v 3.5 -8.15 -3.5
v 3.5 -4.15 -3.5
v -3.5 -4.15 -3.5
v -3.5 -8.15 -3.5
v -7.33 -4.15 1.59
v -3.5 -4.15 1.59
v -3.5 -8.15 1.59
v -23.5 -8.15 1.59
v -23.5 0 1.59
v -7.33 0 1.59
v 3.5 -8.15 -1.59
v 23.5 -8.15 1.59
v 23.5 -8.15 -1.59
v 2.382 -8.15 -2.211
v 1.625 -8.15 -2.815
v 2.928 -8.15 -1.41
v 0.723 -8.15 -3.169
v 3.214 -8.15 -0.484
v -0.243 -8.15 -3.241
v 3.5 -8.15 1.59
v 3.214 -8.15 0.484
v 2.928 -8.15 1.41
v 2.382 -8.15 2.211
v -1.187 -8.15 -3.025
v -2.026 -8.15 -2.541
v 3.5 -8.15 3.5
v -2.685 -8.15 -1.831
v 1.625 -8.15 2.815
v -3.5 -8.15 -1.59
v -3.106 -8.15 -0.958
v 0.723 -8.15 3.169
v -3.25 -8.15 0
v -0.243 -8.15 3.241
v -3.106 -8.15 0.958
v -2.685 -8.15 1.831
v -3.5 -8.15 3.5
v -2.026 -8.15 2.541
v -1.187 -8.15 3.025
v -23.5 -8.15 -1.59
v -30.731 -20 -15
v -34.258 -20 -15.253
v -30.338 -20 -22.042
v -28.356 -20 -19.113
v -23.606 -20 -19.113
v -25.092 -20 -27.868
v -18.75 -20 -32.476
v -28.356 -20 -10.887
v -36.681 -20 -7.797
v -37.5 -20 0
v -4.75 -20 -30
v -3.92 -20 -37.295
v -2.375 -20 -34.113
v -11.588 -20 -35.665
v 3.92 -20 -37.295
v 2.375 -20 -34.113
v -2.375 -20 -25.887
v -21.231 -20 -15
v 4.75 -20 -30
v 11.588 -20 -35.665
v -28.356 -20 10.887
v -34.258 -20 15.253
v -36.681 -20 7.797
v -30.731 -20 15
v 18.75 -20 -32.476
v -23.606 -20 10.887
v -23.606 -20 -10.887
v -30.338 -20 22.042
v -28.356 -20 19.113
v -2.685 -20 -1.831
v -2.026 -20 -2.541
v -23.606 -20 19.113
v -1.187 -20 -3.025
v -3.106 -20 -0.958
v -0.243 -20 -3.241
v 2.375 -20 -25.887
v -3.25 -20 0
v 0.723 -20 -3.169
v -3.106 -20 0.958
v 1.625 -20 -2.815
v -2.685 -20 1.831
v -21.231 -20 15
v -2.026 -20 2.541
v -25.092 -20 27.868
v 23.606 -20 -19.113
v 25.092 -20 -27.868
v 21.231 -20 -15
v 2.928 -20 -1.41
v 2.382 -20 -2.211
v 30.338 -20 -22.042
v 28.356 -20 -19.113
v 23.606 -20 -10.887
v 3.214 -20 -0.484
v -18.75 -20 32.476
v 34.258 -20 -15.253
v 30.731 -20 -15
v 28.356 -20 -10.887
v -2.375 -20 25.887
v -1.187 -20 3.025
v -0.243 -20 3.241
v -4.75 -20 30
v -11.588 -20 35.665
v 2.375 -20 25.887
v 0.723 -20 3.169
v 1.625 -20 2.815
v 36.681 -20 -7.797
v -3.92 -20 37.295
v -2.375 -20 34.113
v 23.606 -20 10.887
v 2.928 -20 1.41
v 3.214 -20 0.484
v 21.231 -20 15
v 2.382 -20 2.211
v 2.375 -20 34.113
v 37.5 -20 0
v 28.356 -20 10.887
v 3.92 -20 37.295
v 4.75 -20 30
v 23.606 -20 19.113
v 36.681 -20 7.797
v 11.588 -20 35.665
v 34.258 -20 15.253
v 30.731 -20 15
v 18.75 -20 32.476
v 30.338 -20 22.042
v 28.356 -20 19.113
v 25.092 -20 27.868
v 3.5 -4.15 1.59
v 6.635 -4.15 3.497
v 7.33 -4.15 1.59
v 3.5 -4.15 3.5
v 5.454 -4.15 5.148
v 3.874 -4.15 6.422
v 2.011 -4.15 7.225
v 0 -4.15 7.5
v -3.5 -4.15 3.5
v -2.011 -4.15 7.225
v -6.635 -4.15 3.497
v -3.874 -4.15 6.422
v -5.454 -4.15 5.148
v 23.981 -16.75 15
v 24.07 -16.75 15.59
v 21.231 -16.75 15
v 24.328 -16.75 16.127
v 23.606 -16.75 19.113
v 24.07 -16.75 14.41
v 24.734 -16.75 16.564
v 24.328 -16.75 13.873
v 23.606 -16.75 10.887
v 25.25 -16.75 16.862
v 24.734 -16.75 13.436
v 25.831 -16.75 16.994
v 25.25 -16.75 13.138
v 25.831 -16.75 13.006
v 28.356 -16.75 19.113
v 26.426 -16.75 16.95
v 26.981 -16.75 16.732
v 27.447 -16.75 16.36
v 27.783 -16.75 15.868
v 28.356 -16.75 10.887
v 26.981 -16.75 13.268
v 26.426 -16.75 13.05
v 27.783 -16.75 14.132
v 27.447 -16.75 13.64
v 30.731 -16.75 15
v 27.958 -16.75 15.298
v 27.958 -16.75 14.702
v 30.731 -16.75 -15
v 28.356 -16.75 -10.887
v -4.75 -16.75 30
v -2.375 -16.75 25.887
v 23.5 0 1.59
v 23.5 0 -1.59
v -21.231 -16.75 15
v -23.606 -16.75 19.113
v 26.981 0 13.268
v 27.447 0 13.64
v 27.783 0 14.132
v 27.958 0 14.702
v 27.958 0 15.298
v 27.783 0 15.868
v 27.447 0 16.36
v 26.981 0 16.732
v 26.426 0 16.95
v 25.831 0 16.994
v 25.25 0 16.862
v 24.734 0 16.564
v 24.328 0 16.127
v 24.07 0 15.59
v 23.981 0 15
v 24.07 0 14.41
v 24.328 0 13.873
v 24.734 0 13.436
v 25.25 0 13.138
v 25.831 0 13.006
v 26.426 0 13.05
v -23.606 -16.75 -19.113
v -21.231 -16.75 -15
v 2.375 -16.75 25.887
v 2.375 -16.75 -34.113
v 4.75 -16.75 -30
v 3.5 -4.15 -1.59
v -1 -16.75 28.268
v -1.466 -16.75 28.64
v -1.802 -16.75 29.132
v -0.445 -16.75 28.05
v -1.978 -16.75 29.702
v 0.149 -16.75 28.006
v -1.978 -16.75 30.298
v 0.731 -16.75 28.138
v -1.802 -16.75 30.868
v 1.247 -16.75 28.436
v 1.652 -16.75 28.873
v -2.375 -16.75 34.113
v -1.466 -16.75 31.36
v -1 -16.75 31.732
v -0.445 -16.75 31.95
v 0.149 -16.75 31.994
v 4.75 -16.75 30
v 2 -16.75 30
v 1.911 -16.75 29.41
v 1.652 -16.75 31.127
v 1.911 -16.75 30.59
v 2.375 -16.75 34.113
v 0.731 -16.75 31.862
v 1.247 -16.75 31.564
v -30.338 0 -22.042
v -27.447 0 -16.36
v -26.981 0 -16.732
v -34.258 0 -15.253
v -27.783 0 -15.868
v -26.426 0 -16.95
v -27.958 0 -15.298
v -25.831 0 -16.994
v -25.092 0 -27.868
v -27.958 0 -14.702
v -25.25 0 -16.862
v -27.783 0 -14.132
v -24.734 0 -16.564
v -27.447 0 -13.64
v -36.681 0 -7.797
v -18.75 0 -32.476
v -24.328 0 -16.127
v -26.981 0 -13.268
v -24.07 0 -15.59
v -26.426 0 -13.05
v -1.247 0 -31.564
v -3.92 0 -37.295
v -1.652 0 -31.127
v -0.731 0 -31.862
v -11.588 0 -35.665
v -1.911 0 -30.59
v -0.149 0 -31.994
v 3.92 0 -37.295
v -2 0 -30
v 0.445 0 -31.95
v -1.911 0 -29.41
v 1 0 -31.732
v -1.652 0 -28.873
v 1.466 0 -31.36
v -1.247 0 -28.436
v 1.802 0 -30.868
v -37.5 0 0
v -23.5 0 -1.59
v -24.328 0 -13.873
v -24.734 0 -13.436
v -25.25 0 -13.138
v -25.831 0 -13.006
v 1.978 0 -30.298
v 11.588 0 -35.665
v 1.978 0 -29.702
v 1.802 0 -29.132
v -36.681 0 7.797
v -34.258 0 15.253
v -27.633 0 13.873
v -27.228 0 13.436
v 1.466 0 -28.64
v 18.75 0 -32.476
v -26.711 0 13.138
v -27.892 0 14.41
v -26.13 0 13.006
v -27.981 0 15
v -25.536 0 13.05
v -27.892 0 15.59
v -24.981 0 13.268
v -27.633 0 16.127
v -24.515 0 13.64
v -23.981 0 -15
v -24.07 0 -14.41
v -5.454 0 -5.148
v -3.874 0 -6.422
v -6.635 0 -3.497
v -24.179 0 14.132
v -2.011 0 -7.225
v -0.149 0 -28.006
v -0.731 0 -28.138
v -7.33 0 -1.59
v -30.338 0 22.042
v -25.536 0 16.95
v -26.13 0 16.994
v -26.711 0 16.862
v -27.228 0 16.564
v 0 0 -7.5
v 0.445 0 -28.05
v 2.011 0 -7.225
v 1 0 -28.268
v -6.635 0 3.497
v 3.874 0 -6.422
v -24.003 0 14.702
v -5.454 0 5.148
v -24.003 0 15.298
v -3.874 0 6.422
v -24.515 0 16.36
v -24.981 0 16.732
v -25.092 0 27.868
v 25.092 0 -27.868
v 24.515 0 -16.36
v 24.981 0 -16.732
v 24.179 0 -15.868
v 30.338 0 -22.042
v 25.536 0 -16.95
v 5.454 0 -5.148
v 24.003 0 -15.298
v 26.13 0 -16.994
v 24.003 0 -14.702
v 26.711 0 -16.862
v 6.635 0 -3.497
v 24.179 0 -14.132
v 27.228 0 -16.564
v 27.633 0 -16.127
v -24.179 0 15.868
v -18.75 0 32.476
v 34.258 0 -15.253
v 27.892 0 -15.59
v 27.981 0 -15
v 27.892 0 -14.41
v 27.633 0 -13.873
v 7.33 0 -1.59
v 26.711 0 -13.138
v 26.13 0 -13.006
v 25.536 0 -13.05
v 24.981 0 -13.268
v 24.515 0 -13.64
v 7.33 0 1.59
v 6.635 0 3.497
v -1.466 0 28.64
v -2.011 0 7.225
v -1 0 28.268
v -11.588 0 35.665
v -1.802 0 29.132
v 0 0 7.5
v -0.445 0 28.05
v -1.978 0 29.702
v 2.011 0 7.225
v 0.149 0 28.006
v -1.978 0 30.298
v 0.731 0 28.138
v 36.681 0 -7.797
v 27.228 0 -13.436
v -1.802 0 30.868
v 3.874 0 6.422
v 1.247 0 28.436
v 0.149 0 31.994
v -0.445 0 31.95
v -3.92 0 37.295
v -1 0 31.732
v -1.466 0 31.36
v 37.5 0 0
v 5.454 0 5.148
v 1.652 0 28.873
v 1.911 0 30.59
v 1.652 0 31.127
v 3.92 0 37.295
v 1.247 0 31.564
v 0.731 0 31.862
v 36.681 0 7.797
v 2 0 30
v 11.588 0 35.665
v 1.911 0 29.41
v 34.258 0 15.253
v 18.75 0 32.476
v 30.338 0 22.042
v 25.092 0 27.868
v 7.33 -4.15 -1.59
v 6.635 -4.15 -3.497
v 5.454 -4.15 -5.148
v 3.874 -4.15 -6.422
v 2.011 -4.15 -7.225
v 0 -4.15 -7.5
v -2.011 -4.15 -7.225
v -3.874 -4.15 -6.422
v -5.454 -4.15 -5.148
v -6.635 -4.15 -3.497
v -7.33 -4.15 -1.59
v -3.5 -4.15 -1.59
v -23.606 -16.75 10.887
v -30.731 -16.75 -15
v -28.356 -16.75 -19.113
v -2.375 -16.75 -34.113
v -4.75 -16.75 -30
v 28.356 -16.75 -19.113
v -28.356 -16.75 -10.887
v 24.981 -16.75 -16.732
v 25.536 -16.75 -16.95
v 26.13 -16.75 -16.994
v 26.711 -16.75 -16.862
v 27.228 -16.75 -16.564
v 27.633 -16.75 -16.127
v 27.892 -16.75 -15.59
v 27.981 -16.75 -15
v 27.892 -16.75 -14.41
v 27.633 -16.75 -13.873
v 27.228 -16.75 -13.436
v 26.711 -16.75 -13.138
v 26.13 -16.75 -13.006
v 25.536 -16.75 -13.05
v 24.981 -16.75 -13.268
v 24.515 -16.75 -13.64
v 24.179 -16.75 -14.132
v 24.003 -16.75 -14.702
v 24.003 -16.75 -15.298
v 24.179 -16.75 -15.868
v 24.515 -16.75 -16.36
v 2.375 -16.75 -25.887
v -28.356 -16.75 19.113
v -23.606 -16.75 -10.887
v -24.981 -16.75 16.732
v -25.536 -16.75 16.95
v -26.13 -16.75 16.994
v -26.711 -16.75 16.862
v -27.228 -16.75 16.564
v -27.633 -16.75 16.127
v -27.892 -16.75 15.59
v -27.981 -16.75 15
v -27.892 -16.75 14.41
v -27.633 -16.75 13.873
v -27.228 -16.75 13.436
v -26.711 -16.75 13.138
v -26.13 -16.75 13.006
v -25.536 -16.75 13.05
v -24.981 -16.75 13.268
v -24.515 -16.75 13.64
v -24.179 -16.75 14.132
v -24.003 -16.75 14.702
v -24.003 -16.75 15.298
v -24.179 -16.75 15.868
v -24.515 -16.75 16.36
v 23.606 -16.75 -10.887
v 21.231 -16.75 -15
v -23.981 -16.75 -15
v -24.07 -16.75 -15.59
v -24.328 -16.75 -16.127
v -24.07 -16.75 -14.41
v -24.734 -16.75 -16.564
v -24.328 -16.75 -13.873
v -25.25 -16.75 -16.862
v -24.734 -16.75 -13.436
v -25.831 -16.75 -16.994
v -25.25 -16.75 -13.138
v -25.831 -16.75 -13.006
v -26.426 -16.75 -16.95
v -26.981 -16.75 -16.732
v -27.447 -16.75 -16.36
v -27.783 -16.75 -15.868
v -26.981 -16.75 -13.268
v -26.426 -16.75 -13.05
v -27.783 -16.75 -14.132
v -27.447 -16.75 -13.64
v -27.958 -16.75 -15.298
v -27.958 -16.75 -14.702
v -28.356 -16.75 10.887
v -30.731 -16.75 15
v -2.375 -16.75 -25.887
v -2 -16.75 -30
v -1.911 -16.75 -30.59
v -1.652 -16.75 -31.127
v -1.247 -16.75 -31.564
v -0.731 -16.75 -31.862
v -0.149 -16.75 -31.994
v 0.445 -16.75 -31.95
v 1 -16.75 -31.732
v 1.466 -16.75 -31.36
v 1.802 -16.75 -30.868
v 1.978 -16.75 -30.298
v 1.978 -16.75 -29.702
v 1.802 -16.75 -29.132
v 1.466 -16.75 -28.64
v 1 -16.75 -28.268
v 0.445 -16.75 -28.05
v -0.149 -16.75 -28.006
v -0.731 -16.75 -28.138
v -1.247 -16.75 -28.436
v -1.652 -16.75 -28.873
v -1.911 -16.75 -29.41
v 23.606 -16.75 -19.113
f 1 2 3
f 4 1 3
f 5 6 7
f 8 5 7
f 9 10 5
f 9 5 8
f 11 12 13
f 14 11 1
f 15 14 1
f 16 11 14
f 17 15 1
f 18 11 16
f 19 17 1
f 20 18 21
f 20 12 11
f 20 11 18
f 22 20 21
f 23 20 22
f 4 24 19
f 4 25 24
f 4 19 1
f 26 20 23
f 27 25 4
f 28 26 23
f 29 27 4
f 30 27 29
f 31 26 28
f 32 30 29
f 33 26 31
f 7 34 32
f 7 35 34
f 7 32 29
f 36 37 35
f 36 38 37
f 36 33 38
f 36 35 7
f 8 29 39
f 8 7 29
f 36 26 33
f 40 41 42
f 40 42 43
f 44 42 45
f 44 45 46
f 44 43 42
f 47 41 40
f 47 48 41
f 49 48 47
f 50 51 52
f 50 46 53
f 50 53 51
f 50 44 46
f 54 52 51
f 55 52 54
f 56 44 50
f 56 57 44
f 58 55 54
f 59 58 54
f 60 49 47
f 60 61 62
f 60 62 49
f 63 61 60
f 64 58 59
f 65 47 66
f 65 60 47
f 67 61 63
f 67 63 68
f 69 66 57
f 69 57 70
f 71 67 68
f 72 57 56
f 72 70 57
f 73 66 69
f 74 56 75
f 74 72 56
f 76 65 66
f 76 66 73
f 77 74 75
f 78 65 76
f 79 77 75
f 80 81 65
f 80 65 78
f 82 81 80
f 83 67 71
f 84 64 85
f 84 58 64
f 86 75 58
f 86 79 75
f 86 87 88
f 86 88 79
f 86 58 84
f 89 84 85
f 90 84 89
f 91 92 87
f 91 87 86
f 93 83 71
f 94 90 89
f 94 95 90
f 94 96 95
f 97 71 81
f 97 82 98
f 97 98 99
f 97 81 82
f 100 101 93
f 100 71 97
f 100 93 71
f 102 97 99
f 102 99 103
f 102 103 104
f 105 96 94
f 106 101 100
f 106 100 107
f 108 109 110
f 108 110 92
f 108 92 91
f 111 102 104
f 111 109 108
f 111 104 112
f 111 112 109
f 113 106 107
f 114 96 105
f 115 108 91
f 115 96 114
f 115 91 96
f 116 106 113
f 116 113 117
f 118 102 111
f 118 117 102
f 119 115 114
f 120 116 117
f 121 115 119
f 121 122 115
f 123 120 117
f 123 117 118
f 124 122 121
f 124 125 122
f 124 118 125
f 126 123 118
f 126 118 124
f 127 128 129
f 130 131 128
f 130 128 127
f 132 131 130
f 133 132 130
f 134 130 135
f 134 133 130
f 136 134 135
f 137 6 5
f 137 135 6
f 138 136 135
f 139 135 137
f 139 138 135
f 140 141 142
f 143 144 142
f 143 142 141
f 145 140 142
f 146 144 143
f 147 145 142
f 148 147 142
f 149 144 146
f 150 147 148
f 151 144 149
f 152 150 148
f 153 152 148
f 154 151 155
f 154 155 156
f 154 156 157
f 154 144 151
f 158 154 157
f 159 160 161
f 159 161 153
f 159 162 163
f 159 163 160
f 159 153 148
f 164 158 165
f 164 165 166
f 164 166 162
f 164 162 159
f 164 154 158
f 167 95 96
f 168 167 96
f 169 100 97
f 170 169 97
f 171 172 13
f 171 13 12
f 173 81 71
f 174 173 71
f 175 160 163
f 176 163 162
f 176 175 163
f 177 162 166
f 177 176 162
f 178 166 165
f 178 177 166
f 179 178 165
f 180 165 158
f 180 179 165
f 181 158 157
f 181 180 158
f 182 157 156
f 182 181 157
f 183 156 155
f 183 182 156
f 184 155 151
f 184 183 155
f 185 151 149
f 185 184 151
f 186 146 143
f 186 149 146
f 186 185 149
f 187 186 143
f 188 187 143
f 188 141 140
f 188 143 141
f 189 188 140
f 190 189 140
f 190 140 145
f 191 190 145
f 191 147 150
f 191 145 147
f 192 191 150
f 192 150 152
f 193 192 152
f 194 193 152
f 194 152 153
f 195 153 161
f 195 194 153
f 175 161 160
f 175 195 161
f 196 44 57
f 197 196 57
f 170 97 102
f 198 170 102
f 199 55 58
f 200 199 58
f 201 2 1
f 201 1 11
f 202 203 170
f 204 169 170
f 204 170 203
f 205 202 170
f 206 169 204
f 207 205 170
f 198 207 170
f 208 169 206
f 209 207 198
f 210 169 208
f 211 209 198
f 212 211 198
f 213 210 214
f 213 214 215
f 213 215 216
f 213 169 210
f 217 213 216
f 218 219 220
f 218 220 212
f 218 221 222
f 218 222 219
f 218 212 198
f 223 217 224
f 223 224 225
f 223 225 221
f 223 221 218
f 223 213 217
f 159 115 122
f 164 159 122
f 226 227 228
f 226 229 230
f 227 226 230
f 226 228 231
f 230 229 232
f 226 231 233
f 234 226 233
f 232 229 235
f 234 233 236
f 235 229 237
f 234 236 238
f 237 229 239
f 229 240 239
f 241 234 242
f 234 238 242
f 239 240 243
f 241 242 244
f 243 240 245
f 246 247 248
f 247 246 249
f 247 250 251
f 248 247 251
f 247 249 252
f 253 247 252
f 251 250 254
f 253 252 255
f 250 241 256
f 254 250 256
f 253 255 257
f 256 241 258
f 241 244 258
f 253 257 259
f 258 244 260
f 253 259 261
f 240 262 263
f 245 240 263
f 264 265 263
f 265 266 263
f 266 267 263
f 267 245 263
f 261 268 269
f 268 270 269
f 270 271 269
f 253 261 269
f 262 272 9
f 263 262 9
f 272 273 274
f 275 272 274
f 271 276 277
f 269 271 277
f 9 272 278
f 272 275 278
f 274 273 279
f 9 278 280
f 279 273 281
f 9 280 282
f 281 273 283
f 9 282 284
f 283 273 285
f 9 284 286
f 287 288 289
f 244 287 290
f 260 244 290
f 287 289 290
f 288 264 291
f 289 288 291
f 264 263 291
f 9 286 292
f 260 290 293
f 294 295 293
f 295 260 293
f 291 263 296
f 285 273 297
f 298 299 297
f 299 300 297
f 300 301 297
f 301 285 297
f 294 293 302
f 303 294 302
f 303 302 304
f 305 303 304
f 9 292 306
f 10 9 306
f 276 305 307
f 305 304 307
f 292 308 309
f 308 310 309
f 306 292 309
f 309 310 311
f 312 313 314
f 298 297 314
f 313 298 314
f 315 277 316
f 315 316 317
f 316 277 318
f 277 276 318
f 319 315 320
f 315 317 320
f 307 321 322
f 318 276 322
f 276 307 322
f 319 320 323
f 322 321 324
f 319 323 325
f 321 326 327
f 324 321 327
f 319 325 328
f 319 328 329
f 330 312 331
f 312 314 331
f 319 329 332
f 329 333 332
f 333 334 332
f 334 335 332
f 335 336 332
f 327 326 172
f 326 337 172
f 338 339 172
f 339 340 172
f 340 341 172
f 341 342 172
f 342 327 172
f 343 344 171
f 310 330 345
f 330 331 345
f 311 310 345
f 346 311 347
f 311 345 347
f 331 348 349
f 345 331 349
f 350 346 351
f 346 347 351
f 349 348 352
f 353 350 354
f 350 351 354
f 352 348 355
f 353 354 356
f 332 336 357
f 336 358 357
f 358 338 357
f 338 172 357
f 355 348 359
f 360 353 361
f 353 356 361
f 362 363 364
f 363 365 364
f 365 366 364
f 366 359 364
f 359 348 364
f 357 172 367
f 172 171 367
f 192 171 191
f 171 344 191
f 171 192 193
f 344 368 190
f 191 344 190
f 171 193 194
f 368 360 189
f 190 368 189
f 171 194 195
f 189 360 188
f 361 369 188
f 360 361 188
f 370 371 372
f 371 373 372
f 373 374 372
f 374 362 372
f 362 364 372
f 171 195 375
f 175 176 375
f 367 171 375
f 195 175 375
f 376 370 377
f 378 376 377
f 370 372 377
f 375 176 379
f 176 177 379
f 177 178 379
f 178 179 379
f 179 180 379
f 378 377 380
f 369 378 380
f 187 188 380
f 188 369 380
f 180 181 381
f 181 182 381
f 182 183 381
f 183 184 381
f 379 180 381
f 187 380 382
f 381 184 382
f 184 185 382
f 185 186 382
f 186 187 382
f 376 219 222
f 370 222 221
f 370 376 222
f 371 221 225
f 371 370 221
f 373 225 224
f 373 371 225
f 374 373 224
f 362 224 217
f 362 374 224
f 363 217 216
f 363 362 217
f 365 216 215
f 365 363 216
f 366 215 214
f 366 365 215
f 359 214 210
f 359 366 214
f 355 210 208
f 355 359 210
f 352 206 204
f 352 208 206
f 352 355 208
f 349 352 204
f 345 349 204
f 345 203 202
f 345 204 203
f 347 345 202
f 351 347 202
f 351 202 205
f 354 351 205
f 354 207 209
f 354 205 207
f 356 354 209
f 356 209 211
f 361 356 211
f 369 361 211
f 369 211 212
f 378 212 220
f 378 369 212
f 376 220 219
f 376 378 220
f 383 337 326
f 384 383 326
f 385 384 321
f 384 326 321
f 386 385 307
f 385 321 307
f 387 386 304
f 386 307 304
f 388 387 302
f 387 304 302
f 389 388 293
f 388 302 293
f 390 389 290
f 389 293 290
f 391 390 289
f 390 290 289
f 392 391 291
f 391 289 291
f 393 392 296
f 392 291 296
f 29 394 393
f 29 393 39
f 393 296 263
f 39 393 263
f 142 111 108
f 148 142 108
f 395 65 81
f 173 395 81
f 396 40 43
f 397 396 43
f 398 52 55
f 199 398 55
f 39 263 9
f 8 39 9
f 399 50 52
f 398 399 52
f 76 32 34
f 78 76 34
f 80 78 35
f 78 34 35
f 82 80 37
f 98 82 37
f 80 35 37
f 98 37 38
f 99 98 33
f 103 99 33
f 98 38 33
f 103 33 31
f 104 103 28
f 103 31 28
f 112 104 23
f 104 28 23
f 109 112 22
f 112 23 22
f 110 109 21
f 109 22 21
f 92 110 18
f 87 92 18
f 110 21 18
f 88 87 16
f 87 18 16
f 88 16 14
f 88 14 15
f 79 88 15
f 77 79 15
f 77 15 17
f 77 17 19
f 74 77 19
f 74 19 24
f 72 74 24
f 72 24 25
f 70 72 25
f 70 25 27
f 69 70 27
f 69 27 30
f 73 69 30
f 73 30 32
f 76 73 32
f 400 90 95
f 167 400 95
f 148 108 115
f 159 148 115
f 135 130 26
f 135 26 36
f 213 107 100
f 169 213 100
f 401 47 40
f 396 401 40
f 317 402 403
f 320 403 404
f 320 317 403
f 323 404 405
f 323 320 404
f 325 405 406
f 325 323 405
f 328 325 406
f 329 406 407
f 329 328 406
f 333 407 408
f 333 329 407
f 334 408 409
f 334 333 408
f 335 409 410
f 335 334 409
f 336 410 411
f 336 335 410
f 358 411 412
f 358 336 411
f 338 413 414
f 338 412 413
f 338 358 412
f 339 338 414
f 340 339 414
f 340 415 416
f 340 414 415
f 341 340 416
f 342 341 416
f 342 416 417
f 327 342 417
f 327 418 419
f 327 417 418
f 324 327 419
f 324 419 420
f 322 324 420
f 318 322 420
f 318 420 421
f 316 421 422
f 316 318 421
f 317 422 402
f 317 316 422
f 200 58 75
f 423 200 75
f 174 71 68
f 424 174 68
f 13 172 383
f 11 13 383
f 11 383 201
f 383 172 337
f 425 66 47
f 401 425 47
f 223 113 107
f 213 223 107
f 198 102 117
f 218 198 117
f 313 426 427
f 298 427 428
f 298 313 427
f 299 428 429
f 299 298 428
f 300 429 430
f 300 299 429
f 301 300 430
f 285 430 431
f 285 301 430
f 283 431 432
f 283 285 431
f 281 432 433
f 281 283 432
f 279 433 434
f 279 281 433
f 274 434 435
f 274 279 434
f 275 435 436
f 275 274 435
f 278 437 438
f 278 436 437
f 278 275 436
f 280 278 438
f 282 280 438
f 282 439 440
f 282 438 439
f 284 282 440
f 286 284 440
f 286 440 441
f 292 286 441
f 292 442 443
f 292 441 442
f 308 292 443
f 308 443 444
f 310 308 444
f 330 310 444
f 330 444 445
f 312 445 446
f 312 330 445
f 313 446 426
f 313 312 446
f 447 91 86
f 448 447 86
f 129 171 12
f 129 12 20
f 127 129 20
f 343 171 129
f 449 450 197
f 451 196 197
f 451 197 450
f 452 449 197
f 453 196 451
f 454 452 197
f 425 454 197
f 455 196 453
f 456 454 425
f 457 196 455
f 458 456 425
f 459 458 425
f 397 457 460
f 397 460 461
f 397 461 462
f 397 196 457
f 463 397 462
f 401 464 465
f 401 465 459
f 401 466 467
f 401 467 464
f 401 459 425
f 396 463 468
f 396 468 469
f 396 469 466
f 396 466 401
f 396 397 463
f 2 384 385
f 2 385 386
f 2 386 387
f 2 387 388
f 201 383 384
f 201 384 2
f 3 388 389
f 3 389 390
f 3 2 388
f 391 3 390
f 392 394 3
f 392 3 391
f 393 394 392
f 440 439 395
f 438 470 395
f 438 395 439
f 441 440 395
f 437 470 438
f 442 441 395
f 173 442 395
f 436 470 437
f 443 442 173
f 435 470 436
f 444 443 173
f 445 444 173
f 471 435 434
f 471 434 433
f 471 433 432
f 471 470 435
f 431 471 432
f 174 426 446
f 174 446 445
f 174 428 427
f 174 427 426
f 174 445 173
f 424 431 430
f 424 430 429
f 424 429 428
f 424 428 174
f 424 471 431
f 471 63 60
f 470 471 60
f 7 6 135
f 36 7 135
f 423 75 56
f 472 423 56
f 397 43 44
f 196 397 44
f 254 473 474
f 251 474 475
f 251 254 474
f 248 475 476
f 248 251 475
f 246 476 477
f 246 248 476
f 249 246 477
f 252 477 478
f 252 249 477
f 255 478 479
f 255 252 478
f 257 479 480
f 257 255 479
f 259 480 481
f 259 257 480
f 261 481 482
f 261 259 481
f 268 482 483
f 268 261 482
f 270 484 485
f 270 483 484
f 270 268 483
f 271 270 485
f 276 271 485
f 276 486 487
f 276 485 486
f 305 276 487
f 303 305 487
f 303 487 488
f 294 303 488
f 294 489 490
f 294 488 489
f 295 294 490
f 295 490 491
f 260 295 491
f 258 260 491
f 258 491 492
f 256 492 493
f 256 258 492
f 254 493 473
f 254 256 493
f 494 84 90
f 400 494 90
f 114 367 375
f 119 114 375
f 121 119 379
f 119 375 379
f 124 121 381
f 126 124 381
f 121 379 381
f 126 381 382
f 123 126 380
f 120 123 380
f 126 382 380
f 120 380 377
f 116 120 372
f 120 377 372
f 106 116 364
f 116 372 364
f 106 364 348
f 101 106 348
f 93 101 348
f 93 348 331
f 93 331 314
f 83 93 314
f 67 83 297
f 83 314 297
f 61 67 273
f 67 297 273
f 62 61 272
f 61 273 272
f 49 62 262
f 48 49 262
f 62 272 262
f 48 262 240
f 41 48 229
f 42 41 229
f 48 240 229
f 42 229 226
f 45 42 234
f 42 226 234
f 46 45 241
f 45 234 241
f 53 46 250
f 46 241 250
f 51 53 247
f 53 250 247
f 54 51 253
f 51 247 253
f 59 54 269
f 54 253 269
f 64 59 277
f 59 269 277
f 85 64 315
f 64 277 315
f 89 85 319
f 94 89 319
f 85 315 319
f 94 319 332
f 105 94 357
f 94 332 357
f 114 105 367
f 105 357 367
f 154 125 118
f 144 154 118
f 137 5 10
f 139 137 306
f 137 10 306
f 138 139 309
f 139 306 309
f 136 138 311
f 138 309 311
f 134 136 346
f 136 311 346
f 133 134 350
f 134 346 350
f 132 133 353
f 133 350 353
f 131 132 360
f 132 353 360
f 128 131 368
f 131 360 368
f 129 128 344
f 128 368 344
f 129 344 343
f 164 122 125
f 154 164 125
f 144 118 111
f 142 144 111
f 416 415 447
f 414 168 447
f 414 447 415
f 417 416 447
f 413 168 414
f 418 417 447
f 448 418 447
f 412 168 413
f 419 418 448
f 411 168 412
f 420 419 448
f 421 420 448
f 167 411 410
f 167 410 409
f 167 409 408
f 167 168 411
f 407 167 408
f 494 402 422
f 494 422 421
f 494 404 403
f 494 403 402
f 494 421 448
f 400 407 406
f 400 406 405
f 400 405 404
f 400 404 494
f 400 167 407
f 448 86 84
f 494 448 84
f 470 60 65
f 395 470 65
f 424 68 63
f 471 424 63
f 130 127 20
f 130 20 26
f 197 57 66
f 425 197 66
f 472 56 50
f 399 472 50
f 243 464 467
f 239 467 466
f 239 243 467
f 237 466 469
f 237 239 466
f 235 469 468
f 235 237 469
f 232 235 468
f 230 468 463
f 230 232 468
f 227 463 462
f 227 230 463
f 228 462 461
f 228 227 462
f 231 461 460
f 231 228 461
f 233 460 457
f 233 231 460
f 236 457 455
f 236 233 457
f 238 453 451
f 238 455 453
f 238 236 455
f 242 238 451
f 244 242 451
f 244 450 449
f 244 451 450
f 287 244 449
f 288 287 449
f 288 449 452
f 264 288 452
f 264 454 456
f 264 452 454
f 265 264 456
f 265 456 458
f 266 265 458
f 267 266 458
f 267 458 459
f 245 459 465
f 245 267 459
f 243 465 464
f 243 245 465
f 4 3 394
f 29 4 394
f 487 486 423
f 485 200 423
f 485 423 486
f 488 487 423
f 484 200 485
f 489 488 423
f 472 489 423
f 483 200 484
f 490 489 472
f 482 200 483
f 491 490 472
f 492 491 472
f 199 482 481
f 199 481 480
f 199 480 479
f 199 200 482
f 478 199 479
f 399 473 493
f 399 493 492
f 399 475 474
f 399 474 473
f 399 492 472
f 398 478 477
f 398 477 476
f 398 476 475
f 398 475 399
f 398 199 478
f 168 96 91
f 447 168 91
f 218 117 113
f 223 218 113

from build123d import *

# Parameters (mm, degrees)
F0_R            = 37.5
F1_DEPTH        = 20
F2_R            = 2
F3_DEPTH        = 20.001
F3_COPIES_COUNT = 6
F5_DEPTH        = 3.25
F5_COPIES_COUNT = 6
F6_R            = 7.5
F7_DEPTH        = 4.15
F8_W            = 7
F8_H            = 7
F9_DEPTH        = 4
F10_W           = 47
F10_H           = 3.18
F11_DEPTH       = 8.15
F12_R           = 3.25
F13_DEPTH       = 11.851


# Not quite as in the source:
# - a pattern or mirror of a feature is missing from the dataset's text; its kind, count and spacing are read off the source's solid


with BuildPart() as f1:
    # F0 (on Front) → F1 (new body)
    with BuildSketch(Plane.XZ):
        Circle(F0_R)
    extrude(amount=F1_DEPTH)

    # F2 (on Front) → F3 (cut, through all)
    with BuildSketch(Plane.XZ):
        with Locations((0, 30)):
            Circle(F2_R)
    f3 = extrude(amount=F3_DEPTH, mode=Mode.SUBTRACT)

    # F3_copies: F3 ×6 about axis
    f3_copies_axis = Axis((0, 0, 0), (0, 1, 0))
    for i in range(1, F3_COPIES_COUNT):
        add(f3.rotate(f3_copies_axis, i * 360 / F3_COPIES_COUNT), mode=Mode.SUBTRACT)

    # F4 (on face) → F5 (cut)
    with BuildSketch(Plane.XZ.offset(20)):
        Polygon((2.3749, 34.1134474629), (-2.3749, 34.1134474629), (-4.7498, 30), (-2.3749, 25.8865525371), (2.3749, 25.8865525371), (4.7498, 30), align=None)
    f5 = extrude(amount=-F5_DEPTH, mode=Mode.SUBTRACT)

    # F5_copies: F5 ×6 about axis
    f5_copies_axis = Axis((0, 0, 0), (0, 1, 0))
    for i in range(1, F5_COPIES_COUNT):
        add(f5.rotate(f5_copies_axis, i * 360 / F5_COPIES_COUNT), mode=Mode.SUBTRACT)

    # F6 (on face) → F7 (cut)
    with BuildSketch(Plane(origin=(0, 0, 0), x_dir=(-1, 0, 0), z_dir=(0, 1, 0))):
        Circle(F6_R)
    extrude(amount=-F7_DEPTH, mode=Mode.SUBTRACT)

    # F8 (on face) → F9 (cut)
    with BuildSketch(Plane(origin=(0, -4.15, 0), x_dir=(-1, 0, 0), z_dir=(0, 1, 0))):
        Rectangle(F8_W, F8_H)
    extrude(amount=-F9_DEPTH, mode=Mode.SUBTRACT)

    # F10 (on face) → F11 (cut, through all)
    with BuildSketch(Plane(origin=(0, 0, 0), x_dir=(-1, 0, 0), z_dir=(0, 1, 0))):
        Rectangle(F10_W, F10_H)
    extrude(amount=-F11_DEPTH, mode=Mode.SUBTRACT)

    # F12 (on face) → F13 (cut, through all)
    with BuildSketch(Plane(origin=(0, -8.15, 0), x_dir=(-1, 0, 0), z_dir=(0, 1, 0))):
        Circle(F12_R)
    extrude(amount=-F13_DEPTH, mode=Mode.SUBTRACT)


solid = f1.part
